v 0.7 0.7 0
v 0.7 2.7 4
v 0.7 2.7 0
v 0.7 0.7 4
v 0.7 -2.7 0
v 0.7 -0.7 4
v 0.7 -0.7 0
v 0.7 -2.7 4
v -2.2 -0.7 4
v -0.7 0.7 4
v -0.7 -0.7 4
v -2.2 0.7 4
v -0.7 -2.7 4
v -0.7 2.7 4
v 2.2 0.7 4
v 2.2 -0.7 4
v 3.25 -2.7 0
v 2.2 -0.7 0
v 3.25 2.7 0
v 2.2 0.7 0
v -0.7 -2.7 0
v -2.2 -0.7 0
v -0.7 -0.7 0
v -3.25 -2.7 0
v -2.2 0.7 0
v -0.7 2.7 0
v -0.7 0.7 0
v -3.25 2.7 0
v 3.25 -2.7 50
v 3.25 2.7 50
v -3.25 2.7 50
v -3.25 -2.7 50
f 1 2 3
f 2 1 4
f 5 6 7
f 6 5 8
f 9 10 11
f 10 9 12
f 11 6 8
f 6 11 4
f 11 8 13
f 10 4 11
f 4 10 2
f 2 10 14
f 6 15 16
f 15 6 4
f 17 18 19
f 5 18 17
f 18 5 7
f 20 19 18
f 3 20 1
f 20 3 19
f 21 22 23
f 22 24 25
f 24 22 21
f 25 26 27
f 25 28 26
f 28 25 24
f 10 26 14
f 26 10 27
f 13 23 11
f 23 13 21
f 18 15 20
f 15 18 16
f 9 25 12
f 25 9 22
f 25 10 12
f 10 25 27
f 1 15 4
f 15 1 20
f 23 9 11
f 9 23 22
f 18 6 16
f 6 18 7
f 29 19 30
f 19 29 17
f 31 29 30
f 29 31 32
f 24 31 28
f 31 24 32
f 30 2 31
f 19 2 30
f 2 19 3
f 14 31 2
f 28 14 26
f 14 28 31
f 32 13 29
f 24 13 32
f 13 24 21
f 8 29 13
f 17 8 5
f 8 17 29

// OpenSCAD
rotate(a = [0, 0, 0]) {
	difference() {
		translate(v = [-3.2500000000, -2.7000000000, 0]) {
			cube(size = [6.5000000000, 5.4000000000, 50]);
		}
		translate(v = [0, 0, 2.0000000000]) {
			union() {
				cube(center = true, size = [1.4000000000, 5.5000000000, 4]);
				cube(center = true, size = [4.4000000000, 1.4000000000, 4]);
			}
		}
	}
}
